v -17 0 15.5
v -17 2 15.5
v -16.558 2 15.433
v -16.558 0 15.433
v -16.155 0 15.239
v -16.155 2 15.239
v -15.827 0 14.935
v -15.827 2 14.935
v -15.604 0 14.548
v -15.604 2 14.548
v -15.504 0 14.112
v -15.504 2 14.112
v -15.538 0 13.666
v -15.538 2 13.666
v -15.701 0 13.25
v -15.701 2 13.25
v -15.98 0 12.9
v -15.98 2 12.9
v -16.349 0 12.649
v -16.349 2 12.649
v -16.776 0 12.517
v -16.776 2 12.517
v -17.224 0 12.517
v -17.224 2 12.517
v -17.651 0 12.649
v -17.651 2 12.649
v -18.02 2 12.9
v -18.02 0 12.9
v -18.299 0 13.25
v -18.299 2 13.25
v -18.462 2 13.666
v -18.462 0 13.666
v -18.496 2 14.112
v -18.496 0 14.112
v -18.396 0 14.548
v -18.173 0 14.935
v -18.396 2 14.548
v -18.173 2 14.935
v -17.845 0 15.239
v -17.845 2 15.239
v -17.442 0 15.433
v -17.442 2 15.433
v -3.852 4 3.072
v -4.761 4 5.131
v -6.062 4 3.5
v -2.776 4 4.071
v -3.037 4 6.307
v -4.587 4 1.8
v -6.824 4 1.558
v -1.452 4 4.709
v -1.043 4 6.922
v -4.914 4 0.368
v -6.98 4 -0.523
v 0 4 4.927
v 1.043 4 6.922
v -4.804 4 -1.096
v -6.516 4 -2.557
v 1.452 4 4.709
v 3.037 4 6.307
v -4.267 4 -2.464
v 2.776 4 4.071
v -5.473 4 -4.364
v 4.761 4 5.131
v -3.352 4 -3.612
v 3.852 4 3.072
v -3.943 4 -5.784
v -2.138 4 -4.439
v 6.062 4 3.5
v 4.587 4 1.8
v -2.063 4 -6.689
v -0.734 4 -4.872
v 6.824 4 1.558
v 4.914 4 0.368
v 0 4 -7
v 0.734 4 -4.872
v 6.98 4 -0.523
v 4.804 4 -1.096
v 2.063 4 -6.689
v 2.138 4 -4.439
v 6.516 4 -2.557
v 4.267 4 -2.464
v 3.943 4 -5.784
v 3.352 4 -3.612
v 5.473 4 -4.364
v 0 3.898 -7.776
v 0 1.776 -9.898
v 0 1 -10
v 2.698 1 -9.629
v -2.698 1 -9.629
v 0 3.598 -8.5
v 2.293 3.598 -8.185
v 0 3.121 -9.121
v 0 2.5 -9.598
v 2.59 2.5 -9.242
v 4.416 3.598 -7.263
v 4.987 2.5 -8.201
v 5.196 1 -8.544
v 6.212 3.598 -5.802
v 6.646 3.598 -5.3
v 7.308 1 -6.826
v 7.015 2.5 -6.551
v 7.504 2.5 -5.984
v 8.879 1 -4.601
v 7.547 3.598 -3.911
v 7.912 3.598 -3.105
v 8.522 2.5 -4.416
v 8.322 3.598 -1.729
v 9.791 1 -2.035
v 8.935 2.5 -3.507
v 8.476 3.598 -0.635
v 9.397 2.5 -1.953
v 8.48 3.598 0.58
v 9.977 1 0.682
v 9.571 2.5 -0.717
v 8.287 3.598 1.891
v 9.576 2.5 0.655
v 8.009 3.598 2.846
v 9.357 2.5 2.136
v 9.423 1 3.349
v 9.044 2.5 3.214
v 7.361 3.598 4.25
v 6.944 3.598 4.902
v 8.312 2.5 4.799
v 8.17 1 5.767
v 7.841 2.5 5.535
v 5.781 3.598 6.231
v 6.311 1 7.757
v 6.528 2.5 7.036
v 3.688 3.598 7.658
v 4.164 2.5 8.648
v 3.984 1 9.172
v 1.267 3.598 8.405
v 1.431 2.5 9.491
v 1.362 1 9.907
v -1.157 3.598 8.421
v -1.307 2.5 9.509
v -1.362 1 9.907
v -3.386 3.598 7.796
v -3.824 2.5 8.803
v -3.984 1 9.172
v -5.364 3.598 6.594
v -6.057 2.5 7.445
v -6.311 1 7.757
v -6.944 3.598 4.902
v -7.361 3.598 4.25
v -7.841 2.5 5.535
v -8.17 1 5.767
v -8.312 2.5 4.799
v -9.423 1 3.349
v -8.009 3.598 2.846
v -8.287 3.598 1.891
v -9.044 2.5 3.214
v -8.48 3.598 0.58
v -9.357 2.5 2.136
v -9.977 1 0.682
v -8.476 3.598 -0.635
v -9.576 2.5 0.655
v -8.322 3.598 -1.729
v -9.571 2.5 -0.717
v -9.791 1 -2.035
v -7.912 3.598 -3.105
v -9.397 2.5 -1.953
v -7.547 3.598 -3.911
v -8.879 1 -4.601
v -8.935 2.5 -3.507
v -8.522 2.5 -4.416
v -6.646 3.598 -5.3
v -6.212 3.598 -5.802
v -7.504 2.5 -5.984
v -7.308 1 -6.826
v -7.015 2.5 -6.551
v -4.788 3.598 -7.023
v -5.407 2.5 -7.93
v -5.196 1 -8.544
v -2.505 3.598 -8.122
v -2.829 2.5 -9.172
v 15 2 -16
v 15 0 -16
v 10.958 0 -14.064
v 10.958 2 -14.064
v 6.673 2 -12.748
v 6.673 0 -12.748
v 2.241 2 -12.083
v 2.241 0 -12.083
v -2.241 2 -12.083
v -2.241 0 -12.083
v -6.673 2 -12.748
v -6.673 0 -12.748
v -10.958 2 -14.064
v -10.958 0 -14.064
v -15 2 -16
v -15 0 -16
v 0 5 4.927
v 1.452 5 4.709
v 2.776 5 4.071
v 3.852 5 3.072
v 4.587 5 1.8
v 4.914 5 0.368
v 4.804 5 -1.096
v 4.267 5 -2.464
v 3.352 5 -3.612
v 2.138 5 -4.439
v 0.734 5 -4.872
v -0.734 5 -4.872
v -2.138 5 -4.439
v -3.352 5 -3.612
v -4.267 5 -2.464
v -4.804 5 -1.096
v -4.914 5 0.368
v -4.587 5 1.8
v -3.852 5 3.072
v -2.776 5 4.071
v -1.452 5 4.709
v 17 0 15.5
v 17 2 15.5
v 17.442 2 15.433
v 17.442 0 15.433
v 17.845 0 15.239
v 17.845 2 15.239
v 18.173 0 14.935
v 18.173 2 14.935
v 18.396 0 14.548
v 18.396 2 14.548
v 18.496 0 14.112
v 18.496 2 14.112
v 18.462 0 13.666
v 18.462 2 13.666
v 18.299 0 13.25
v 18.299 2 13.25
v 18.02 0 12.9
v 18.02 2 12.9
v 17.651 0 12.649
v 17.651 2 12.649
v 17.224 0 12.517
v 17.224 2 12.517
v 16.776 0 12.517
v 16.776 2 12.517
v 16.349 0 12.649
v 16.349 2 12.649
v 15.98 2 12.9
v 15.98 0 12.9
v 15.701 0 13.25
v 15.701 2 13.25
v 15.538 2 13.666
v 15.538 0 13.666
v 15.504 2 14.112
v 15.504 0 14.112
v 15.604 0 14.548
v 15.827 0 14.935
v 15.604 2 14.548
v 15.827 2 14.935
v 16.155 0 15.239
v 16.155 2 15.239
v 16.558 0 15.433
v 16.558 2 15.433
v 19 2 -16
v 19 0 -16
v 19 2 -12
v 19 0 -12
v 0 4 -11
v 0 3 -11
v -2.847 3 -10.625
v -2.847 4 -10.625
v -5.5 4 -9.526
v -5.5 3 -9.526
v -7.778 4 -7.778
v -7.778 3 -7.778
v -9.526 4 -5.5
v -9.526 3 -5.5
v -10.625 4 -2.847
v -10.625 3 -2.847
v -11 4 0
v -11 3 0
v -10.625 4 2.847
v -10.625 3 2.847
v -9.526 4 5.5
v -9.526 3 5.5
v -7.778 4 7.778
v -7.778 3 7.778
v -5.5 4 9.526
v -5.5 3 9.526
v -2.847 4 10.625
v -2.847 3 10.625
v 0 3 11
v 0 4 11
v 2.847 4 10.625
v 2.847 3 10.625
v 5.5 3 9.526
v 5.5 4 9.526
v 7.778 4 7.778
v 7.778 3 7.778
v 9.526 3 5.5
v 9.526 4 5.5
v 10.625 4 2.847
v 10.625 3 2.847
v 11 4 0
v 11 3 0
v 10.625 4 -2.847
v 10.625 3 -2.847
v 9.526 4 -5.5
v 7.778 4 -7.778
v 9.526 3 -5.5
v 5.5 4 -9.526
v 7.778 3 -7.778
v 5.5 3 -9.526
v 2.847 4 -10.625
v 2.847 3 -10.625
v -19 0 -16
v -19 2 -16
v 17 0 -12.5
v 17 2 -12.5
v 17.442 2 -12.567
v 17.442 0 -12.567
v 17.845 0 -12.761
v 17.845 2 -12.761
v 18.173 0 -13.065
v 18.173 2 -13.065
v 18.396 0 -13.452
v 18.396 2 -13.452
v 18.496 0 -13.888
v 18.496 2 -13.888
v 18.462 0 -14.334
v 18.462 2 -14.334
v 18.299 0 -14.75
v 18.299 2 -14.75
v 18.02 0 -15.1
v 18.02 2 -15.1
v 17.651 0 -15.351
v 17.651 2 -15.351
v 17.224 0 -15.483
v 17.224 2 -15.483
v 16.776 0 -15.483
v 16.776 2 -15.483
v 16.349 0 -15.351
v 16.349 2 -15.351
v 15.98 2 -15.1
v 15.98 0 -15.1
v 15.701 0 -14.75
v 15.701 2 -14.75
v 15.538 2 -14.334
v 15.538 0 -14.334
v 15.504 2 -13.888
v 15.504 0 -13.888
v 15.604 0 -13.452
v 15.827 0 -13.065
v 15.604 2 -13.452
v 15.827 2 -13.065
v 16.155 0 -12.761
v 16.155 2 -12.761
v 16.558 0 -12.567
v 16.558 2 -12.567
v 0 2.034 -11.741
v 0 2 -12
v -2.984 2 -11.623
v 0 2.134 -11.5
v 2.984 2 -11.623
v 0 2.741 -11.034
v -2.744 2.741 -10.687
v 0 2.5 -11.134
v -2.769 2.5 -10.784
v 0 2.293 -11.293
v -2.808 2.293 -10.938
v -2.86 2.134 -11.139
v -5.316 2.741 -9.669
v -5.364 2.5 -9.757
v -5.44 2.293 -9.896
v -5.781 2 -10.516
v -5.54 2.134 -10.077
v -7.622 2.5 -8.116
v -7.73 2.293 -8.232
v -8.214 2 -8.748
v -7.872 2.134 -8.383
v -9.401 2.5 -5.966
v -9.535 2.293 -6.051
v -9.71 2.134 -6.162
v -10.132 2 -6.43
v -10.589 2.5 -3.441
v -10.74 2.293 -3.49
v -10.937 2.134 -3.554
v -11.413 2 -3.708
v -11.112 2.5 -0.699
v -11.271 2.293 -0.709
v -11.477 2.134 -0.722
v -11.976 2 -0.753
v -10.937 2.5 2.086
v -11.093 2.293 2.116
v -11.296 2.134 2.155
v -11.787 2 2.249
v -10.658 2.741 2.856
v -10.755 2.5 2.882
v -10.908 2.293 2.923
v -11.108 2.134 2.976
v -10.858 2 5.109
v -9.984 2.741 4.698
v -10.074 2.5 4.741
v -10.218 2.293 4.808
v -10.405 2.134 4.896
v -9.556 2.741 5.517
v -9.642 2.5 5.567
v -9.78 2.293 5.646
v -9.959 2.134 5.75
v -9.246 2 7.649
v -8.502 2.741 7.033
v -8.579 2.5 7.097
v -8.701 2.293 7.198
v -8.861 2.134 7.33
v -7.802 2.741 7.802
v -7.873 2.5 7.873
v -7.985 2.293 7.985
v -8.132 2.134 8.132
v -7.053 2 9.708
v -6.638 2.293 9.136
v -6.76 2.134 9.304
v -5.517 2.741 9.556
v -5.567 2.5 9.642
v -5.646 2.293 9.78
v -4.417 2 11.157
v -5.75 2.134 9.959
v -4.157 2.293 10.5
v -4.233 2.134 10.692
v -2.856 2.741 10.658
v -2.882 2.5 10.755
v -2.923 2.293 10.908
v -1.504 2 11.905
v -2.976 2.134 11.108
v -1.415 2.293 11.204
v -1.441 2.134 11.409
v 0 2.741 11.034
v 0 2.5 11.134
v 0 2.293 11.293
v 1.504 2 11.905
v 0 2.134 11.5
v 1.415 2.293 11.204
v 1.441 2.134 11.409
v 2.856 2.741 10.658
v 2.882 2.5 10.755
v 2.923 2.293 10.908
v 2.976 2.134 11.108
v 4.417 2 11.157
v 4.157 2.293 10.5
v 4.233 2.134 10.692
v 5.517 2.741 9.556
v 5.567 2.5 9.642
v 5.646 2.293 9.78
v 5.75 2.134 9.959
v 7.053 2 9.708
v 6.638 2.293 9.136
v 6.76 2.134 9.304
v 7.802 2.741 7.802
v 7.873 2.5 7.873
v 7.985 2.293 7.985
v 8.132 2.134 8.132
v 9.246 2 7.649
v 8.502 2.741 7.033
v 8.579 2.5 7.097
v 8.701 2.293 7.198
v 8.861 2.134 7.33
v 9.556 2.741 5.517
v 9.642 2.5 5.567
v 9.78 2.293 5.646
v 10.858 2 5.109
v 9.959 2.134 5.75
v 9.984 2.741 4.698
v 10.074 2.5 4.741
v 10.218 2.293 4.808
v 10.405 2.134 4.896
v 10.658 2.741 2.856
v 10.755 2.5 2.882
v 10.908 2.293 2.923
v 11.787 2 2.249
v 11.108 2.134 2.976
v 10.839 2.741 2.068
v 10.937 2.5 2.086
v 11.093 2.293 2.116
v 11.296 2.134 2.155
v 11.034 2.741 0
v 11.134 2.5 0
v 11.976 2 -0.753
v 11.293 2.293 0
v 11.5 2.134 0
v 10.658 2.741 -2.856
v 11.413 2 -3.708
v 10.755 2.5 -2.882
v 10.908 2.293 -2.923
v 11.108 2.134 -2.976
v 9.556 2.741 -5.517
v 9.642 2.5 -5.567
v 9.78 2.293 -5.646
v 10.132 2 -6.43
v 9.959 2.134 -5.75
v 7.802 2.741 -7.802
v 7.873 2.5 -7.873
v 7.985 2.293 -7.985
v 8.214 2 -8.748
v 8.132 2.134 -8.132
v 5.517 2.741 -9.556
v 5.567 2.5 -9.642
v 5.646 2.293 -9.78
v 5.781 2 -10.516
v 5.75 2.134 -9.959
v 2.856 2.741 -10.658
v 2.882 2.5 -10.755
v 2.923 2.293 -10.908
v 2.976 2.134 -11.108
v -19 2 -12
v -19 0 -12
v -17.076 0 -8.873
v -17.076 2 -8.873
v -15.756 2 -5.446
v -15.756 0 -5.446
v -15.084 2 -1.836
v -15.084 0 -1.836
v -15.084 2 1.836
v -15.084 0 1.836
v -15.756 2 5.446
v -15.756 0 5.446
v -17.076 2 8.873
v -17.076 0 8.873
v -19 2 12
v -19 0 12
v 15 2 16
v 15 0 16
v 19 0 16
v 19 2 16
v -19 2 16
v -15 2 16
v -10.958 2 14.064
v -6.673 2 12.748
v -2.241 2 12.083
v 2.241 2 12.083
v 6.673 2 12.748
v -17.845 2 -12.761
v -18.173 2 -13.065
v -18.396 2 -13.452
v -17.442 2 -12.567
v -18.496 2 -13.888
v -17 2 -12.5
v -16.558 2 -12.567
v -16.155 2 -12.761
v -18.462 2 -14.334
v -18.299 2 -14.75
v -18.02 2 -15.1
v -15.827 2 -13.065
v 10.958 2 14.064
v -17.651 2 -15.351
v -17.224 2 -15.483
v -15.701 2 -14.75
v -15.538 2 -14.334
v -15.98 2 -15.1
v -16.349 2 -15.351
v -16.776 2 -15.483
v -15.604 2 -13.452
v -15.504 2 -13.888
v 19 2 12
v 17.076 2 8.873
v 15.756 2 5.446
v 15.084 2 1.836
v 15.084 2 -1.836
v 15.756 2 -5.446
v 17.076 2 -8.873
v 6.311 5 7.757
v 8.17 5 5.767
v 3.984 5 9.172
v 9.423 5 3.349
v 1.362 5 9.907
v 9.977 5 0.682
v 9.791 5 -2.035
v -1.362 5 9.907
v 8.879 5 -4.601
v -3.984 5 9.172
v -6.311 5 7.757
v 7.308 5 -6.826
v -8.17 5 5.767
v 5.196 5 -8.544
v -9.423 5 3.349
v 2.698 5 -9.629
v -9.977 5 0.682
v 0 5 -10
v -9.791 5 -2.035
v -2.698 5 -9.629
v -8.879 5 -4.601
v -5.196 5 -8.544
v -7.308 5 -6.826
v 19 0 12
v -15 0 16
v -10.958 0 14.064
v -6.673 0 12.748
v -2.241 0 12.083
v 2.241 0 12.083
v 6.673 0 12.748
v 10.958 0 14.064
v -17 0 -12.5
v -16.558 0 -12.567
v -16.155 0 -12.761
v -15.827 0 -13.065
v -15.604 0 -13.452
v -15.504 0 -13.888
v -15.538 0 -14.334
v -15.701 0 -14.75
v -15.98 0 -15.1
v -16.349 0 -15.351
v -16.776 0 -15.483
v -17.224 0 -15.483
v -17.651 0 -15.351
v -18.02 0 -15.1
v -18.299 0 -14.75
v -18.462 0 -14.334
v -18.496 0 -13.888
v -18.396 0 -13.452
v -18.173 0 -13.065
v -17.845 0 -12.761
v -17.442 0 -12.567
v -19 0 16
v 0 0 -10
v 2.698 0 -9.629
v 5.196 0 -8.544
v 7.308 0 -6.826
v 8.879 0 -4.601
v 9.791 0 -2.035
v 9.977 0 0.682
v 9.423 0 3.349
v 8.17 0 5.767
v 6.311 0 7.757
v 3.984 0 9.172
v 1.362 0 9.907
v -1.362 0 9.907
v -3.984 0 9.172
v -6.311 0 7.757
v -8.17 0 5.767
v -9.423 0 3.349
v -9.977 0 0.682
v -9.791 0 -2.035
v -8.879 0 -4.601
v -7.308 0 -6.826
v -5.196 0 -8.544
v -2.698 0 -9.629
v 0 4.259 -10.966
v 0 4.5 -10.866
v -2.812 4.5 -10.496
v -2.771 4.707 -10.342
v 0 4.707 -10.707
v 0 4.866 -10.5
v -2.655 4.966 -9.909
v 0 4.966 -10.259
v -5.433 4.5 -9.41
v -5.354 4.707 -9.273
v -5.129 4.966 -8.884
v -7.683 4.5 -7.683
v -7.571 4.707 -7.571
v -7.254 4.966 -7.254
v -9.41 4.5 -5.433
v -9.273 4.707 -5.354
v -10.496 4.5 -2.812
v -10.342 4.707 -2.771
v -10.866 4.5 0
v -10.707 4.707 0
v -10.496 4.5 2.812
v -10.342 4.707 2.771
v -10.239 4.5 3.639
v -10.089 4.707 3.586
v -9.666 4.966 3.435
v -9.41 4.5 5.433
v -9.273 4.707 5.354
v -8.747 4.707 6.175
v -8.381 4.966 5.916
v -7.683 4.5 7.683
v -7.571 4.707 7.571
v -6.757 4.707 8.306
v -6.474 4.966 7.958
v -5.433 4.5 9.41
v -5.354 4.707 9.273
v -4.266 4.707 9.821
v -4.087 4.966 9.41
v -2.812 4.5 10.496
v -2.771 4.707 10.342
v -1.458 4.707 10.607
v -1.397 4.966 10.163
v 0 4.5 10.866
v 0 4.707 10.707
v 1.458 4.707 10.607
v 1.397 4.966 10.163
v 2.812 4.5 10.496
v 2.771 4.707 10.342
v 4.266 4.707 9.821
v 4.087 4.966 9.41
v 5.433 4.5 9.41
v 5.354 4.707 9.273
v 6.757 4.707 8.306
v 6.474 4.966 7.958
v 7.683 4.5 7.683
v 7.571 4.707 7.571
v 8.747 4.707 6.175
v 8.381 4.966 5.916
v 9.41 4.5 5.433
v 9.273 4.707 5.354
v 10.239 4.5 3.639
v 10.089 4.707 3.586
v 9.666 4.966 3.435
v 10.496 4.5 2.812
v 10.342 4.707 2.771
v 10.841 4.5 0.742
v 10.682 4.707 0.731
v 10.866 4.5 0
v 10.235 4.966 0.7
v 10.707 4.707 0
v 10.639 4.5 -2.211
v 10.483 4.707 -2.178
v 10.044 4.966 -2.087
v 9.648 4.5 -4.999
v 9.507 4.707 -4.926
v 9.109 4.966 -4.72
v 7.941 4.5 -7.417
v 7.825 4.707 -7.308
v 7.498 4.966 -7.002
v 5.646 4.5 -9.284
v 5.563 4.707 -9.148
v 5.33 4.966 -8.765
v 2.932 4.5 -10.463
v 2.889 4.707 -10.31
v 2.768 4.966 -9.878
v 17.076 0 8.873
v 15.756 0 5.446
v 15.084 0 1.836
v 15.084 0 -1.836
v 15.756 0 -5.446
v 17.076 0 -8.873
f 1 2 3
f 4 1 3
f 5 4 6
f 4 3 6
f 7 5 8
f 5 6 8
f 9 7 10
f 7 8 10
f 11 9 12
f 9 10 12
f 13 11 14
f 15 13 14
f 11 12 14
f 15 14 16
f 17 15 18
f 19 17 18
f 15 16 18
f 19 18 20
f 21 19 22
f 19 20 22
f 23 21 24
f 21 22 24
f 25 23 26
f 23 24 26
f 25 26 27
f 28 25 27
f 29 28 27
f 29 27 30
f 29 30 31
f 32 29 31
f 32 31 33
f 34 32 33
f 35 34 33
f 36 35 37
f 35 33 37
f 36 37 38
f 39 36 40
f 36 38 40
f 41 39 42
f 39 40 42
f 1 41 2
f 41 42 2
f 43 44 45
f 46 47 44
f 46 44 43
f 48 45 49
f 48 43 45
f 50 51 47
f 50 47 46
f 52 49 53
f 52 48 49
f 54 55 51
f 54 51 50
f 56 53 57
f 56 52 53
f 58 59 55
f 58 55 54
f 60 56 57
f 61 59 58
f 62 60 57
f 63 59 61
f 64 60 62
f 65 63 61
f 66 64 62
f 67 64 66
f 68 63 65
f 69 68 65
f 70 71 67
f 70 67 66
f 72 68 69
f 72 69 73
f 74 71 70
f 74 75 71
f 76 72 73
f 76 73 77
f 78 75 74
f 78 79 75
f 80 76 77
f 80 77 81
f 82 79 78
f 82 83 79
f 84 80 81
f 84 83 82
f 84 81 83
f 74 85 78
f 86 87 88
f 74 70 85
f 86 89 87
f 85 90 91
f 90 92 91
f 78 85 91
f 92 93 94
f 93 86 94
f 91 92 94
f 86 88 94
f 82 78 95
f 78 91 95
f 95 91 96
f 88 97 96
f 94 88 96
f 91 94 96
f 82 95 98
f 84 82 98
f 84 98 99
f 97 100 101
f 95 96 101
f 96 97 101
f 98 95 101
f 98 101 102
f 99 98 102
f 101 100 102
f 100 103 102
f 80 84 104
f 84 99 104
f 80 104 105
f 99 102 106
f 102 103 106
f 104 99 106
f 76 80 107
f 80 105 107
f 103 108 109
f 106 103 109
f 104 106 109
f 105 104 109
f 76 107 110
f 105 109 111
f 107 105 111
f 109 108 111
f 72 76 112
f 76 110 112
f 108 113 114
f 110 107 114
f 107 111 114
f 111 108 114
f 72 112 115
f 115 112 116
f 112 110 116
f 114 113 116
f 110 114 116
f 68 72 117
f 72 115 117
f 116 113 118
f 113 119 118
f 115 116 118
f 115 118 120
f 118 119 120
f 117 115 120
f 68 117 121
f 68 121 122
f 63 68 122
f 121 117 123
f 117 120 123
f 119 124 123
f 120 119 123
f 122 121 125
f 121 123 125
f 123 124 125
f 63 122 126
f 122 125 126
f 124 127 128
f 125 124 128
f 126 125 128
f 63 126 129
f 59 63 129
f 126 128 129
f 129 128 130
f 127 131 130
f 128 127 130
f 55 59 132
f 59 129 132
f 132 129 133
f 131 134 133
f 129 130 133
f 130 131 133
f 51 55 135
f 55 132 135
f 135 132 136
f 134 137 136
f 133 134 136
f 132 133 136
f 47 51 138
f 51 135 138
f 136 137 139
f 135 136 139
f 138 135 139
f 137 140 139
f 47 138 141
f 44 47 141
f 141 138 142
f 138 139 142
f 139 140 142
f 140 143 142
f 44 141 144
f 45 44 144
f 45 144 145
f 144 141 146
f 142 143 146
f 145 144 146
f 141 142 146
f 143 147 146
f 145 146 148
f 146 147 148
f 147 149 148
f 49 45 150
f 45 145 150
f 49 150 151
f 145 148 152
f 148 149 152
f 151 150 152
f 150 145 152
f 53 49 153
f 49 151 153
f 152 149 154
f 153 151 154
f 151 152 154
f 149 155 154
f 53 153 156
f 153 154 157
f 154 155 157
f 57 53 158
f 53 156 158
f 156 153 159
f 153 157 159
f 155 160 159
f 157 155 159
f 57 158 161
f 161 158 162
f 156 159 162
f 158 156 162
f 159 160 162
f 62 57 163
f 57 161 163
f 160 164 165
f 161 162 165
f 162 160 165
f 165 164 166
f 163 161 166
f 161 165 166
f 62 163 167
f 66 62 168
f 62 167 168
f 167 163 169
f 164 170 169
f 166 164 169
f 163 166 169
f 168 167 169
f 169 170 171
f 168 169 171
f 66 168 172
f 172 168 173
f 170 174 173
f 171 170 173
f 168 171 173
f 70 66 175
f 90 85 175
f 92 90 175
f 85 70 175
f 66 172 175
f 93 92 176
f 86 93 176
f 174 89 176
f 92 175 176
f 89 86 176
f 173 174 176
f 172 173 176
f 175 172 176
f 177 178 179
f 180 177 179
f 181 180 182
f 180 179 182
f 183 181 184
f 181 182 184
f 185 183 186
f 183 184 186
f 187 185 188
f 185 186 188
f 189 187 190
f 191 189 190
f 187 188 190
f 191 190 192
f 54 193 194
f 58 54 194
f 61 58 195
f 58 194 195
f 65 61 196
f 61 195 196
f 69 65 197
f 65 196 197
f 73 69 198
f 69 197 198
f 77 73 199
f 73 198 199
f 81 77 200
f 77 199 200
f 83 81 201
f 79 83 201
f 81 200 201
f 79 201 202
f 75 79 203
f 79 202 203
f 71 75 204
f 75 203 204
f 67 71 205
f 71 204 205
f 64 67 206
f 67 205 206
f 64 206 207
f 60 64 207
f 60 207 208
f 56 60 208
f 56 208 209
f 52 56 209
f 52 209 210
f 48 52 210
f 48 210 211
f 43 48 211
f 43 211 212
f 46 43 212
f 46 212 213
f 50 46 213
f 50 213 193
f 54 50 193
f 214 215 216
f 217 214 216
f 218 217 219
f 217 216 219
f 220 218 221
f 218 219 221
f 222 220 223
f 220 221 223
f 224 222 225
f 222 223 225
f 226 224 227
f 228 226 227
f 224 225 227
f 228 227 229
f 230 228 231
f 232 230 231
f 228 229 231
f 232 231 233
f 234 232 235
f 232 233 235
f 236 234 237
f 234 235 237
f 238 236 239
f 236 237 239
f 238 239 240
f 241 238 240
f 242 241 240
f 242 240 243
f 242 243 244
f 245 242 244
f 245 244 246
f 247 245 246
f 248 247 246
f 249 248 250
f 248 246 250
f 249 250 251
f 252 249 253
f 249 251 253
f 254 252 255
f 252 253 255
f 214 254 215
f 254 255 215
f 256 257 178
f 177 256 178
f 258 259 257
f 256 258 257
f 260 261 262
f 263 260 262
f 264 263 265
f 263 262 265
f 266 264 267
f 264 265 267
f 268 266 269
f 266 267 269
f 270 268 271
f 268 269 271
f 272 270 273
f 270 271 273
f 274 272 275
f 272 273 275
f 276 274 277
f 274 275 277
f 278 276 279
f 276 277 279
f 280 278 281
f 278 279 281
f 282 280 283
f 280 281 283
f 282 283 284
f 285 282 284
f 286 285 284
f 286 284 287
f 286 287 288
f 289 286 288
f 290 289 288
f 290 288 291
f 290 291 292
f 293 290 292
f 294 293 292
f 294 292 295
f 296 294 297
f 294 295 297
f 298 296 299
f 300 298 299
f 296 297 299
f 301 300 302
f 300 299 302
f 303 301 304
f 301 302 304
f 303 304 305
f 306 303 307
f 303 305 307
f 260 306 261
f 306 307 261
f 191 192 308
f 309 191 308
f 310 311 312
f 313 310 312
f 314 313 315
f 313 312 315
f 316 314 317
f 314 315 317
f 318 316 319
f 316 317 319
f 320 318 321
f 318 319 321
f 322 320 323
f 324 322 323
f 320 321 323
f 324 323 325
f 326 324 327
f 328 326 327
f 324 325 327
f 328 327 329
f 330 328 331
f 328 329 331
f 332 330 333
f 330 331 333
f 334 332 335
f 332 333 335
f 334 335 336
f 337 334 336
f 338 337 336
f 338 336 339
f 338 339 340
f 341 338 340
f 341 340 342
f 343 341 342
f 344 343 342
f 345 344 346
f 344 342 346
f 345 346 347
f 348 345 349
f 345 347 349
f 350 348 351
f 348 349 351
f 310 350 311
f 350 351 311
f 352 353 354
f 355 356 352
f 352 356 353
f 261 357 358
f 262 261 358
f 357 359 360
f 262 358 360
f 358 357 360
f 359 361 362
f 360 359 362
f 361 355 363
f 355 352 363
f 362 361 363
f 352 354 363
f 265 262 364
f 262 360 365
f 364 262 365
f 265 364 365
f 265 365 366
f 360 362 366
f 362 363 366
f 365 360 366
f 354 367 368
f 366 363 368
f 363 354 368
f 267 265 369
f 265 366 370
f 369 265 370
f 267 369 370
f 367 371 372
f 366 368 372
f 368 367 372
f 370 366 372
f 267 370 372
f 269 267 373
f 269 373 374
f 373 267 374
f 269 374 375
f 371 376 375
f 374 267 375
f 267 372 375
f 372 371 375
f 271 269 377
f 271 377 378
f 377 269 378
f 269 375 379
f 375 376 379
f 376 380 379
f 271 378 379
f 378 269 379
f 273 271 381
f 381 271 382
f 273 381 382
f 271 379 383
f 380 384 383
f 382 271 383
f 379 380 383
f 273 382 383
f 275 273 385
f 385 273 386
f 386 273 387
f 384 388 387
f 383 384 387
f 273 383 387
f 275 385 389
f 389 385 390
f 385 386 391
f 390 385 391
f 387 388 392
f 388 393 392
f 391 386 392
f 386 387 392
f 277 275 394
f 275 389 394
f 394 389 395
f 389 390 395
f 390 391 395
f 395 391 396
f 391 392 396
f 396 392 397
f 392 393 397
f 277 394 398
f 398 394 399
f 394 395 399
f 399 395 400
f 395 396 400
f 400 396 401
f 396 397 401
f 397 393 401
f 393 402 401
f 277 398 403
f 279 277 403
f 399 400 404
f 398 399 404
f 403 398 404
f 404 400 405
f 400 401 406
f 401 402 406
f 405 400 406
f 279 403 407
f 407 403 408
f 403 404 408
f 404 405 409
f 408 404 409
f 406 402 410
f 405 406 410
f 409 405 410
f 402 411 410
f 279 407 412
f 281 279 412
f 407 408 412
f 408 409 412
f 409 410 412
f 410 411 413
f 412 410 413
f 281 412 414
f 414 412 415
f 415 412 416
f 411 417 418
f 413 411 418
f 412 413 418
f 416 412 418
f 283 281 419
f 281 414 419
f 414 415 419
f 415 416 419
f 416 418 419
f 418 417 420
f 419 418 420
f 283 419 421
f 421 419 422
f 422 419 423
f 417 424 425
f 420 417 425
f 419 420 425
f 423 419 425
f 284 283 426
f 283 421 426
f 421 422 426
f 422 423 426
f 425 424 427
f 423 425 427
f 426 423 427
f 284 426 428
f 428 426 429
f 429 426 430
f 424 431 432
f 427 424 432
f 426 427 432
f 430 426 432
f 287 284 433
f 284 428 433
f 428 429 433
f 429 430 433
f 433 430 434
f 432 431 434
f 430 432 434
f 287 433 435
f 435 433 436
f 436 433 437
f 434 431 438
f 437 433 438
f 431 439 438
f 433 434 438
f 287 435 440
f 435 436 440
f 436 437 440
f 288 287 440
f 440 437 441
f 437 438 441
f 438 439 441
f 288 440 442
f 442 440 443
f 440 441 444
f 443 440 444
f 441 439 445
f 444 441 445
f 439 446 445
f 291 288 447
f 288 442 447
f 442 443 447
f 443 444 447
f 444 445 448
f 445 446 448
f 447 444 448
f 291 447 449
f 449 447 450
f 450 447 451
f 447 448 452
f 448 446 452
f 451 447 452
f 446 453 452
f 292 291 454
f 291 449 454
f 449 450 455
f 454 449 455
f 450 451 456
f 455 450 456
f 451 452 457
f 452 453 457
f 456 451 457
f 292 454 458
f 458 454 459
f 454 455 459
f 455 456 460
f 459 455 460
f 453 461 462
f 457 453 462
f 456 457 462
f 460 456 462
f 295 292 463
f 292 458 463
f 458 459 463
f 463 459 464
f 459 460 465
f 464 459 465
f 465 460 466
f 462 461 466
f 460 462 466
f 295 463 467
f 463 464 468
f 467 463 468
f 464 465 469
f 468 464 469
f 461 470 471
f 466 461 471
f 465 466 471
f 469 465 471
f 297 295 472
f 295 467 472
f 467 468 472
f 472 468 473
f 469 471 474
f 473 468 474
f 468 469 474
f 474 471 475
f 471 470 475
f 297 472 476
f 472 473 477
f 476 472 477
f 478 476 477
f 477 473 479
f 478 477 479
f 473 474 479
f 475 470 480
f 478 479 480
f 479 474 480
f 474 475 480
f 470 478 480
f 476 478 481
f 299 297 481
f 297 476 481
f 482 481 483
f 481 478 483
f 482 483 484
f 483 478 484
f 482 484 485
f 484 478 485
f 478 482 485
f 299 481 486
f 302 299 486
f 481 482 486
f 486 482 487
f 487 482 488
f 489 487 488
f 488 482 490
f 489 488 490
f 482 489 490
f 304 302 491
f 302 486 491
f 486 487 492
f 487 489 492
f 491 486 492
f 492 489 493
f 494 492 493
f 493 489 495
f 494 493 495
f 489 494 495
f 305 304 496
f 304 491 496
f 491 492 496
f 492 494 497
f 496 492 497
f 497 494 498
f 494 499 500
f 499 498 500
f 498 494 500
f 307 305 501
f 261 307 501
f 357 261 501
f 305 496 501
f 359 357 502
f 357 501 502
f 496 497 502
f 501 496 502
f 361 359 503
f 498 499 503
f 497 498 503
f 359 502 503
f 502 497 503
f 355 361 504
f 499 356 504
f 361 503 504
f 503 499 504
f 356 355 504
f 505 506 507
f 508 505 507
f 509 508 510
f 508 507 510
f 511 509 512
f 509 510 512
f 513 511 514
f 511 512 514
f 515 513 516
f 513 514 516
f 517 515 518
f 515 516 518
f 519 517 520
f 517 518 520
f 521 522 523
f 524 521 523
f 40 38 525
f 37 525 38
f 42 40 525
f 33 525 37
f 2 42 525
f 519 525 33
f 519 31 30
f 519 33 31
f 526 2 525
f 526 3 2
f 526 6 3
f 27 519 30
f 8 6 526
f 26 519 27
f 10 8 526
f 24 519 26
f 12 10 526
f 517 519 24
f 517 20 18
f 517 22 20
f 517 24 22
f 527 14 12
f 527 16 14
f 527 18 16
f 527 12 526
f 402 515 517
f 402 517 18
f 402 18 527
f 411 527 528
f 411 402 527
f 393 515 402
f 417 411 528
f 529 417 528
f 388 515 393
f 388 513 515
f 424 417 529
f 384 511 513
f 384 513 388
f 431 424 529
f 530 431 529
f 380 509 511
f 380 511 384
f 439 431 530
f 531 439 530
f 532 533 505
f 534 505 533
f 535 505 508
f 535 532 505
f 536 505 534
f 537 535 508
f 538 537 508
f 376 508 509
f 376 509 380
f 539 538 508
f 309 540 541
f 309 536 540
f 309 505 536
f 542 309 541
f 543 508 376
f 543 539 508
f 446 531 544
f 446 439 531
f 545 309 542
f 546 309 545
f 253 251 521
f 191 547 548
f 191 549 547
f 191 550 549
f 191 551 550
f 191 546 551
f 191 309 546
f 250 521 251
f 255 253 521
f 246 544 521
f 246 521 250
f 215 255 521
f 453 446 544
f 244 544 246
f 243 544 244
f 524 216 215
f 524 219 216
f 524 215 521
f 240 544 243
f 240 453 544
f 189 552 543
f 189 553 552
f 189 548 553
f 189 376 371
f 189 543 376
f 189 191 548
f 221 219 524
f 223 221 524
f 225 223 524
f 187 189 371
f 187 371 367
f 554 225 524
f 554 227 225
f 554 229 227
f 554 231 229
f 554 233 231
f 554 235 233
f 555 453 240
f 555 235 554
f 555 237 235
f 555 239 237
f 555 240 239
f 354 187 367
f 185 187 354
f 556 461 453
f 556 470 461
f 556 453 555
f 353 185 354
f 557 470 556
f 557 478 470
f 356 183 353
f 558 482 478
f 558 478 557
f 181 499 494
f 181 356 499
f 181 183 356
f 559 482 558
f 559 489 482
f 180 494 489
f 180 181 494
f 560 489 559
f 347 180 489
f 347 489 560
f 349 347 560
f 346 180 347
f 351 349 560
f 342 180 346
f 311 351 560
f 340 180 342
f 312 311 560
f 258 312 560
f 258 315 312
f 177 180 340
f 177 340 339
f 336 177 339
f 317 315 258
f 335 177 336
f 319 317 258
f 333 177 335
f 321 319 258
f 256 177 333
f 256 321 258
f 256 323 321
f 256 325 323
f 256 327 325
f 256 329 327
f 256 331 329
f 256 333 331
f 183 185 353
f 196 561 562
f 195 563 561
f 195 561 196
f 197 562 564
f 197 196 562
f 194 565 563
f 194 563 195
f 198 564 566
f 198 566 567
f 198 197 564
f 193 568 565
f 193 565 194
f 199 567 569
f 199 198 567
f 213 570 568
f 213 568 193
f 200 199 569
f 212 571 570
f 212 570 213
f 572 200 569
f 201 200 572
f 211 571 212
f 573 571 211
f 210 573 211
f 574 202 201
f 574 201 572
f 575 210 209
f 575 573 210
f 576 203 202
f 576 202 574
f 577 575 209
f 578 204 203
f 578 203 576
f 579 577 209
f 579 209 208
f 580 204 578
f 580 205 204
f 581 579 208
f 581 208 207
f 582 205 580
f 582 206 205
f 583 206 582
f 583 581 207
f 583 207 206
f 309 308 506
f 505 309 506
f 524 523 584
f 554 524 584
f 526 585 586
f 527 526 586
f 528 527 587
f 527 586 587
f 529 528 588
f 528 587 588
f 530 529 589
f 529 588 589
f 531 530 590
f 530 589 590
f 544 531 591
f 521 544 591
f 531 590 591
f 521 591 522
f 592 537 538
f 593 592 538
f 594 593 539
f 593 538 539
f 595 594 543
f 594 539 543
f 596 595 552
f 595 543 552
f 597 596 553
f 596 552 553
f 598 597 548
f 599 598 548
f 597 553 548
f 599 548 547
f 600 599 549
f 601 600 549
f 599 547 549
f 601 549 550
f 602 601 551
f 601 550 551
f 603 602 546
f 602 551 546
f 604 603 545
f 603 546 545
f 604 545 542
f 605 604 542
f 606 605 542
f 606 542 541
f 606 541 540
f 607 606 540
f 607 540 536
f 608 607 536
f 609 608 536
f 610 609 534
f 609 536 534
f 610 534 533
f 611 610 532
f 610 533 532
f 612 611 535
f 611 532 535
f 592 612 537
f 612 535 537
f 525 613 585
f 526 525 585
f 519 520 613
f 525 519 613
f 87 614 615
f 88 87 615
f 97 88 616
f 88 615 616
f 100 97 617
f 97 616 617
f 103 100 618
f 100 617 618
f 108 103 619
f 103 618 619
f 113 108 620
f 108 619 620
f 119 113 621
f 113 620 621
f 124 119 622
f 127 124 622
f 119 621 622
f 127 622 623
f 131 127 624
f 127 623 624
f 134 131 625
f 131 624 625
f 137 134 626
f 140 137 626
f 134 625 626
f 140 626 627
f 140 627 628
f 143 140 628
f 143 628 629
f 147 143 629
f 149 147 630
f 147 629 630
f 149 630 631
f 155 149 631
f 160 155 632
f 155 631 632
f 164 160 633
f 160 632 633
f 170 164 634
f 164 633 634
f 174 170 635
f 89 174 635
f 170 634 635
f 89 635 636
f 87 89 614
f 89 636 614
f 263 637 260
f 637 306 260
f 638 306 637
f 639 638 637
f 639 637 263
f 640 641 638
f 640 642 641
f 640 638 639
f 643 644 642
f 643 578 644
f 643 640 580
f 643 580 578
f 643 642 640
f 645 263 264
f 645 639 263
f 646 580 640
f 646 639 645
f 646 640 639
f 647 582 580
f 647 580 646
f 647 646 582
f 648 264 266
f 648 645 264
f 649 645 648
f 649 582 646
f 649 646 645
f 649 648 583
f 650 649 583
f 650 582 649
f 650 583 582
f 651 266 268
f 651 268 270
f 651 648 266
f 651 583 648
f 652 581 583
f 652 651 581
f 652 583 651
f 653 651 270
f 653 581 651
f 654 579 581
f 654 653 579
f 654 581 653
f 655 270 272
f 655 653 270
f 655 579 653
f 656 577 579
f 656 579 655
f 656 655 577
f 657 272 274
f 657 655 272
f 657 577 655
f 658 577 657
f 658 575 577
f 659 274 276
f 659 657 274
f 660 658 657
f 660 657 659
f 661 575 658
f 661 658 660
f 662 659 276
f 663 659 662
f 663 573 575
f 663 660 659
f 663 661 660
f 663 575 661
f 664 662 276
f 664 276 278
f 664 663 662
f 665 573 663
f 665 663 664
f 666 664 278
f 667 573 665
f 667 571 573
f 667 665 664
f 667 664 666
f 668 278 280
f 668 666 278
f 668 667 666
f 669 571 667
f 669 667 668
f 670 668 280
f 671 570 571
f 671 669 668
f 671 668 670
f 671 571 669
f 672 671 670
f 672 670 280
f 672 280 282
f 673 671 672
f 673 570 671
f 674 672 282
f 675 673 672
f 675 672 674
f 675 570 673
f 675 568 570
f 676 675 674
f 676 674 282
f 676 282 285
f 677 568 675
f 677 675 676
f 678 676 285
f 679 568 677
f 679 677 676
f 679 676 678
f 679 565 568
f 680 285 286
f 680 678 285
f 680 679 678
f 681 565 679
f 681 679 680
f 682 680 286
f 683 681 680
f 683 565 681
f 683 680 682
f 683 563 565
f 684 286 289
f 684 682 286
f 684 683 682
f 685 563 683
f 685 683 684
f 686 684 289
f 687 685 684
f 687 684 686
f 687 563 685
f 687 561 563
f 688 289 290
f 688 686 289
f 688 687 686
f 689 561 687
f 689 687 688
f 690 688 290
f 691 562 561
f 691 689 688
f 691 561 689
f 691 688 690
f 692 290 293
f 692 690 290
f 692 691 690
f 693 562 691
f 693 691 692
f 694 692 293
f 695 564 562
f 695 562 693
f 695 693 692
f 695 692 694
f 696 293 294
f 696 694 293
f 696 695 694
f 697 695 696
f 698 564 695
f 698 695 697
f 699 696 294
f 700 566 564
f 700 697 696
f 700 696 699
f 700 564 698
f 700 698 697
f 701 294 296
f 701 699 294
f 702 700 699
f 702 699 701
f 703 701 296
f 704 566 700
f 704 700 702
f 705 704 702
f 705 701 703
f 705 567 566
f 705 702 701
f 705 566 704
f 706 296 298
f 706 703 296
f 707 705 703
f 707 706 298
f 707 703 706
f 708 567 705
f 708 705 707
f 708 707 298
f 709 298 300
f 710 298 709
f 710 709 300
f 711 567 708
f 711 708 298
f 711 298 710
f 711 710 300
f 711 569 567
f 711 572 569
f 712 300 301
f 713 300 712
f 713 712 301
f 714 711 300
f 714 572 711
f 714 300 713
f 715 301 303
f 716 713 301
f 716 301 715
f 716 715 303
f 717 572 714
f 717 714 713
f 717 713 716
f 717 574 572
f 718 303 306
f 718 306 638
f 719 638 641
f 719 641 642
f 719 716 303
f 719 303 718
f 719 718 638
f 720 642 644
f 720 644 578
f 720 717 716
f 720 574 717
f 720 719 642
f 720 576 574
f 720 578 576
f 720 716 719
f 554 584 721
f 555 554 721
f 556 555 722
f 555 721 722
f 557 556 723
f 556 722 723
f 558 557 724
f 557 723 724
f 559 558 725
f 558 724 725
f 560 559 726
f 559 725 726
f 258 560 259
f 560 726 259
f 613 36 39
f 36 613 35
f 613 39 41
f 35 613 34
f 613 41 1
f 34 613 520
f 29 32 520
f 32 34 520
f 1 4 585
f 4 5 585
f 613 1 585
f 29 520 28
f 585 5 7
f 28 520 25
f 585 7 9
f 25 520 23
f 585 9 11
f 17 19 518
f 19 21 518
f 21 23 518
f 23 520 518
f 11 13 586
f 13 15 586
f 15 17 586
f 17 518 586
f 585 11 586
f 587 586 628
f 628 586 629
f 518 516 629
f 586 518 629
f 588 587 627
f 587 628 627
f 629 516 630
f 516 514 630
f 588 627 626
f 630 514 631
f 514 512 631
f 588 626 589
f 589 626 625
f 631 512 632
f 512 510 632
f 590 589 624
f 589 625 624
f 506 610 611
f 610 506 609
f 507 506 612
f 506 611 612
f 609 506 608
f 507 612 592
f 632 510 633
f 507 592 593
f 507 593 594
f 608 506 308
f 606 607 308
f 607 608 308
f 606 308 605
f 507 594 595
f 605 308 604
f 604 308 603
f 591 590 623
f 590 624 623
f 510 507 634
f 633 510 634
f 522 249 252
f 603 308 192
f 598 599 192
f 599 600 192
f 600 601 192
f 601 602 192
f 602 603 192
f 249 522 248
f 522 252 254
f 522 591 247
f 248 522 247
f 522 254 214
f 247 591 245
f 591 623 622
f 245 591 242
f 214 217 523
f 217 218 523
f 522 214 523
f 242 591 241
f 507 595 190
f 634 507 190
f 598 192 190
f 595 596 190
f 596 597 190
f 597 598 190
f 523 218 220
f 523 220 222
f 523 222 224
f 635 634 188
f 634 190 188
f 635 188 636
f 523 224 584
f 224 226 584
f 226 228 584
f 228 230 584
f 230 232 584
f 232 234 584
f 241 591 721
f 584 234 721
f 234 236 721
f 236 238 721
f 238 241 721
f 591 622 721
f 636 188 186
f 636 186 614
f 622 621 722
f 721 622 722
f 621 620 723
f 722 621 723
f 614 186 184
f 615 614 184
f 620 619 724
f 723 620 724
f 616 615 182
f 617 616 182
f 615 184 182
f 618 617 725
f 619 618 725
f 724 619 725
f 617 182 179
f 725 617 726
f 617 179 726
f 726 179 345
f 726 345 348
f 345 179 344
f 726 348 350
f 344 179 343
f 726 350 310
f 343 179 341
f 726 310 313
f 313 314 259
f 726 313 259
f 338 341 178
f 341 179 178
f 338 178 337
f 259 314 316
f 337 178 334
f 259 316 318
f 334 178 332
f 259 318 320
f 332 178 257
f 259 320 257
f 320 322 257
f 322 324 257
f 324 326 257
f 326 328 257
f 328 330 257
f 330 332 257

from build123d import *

# Parameters (mm, degrees)
SALIENTE_EXTRUIR2_DEPTH = 2
CROQUIS3_R              = 1.5000000000000002
CROQUIS3_R_2            = 1.5000000000000009
CORTAR_EXTRUIR1_DEPTH   = 2
CROQUIS4_R              = 11
SALIENTE_EXTRUIR3_DEPTH = 3
REDONDEO1_R             = 1
REDONDEO2_R             = 1
CROQUIS6_R              = 4.927466062817137
CORTAR_EXTRUIR2_DEPTH   = 3
CROQUIS7_R              = 10
CORTAR_EXTRUIR3_DEPTH   = 4
REDONDEO3_R             = 3


with BuildPart() as part:
    # Croquis2 → Saliente-Extruir2 (new body)
    with BuildSketch(Plane(origin=(0, 0, 0), x_dir=(1, 0, 0), z_dir=(0, 1, 0))):
        with BuildLine():
            Line((-19.000000000000007, -12), (-19, -16))
            Line((-19, -16), (-15, -16))
            ThreePointArc((-15, -16), (1.84e-15, -12.000000000000014), (15, -16))
            Line((15, -16), (19, -16))
            Line((19, -16), (19, -12))
            ThreePointArc((19, -12), (15.000000000000014, -2.45e-15), (19, 12))
            Line((19, 12), (19, 16))
            Line((19, 16), (15, 16))
            ThreePointArc((15, 16), (1.84e-15, 12.000000000000014), (-15, 16))
            Line((-15, 16), (-19, 16))
            Line((-19, 16), (-19.000000000000007, 12))
            ThreePointArc((-19.000000000000007, 12), (-15.000000000000007, 0), (-19.000000000000007, -12))
        make_face()
    extrude(amount=SALIENTE_EXTRUIR2_DEPTH)

    # Croquis3 → Cortar-Extruir1 (cut)
    with BuildSketch(Plane(origin=(0, 2, 0), x_dir=(1, 0, 0), z_dir=(0, 1, 0))):
        with Locations((-17, 13.999999999999998)):
            Circle(CROQUIS3_R)
        with Locations((17, 14.000000000000002)):
            Circle(CROQUIS3_R_2)
        with Locations((17.000000000000004, -14.000000000000002)):
            Circle(CROQUIS3_R_2)
        with Locations((-17, -14.000000000000002)):
            Circle(CROQUIS3_R)
    extrude(amount=-CORTAR_EXTRUIR1_DEPTH, mode=Mode.SUBTRACT)

    # Croquis4 → Saliente-Extruir3 (add)
    with BuildSketch(Plane(origin=(0, 2, 0), x_dir=(1, 0, 0), z_dir=(0, 1, 0))):
        Circle(CROQUIS4_R)
    extrude(amount=SALIENTE_EXTRUIR3_DEPTH)

    # Redondeo1
    redondeo1_edges = [part.edges().sort_by_distance(p)[0] for p in [
        (-11, 5, -6.23e-15),
    ]]
    fillet(redondeo1_edges, radius=REDONDEO1_R)

    # Redondeo2
    redondeo2_edges = [part.edges().sort_by_distance(p)[0] for p in [
        (-11, 2, -6.23e-15),
    ]]
    fillet(redondeo2_edges, radius=REDONDEO2_R)

    # Croquis6 → Cortar-Extruir2 (cut)
    with BuildSketch(Plane(origin=(0, 5, 0), x_dir=(1, 0, 0), z_dir=(0, 1, 0))):
        Circle(CROQUIS6_R)
    extrude(amount=-CORTAR_EXTRUIR2_DEPTH, mode=Mode.SUBTRACT)

    # Croquis7 → Cortar-Extruir3 (cut)
    with BuildSketch(Plane.XZ):
        Circle(CROQUIS7_R)
    extrude(amount=-CORTAR_EXTRUIR3_DEPTH, mode=Mode.SUBTRACT)

    # Redondeo3
    redondeo3_edges = [part.edges().sort_by_distance(p)[0] for p in [
        (-10, 4, 1.22e-15),
    ]]
    fillet(redondeo3_edges, radius=REDONDEO3_R)


solid = part.part
